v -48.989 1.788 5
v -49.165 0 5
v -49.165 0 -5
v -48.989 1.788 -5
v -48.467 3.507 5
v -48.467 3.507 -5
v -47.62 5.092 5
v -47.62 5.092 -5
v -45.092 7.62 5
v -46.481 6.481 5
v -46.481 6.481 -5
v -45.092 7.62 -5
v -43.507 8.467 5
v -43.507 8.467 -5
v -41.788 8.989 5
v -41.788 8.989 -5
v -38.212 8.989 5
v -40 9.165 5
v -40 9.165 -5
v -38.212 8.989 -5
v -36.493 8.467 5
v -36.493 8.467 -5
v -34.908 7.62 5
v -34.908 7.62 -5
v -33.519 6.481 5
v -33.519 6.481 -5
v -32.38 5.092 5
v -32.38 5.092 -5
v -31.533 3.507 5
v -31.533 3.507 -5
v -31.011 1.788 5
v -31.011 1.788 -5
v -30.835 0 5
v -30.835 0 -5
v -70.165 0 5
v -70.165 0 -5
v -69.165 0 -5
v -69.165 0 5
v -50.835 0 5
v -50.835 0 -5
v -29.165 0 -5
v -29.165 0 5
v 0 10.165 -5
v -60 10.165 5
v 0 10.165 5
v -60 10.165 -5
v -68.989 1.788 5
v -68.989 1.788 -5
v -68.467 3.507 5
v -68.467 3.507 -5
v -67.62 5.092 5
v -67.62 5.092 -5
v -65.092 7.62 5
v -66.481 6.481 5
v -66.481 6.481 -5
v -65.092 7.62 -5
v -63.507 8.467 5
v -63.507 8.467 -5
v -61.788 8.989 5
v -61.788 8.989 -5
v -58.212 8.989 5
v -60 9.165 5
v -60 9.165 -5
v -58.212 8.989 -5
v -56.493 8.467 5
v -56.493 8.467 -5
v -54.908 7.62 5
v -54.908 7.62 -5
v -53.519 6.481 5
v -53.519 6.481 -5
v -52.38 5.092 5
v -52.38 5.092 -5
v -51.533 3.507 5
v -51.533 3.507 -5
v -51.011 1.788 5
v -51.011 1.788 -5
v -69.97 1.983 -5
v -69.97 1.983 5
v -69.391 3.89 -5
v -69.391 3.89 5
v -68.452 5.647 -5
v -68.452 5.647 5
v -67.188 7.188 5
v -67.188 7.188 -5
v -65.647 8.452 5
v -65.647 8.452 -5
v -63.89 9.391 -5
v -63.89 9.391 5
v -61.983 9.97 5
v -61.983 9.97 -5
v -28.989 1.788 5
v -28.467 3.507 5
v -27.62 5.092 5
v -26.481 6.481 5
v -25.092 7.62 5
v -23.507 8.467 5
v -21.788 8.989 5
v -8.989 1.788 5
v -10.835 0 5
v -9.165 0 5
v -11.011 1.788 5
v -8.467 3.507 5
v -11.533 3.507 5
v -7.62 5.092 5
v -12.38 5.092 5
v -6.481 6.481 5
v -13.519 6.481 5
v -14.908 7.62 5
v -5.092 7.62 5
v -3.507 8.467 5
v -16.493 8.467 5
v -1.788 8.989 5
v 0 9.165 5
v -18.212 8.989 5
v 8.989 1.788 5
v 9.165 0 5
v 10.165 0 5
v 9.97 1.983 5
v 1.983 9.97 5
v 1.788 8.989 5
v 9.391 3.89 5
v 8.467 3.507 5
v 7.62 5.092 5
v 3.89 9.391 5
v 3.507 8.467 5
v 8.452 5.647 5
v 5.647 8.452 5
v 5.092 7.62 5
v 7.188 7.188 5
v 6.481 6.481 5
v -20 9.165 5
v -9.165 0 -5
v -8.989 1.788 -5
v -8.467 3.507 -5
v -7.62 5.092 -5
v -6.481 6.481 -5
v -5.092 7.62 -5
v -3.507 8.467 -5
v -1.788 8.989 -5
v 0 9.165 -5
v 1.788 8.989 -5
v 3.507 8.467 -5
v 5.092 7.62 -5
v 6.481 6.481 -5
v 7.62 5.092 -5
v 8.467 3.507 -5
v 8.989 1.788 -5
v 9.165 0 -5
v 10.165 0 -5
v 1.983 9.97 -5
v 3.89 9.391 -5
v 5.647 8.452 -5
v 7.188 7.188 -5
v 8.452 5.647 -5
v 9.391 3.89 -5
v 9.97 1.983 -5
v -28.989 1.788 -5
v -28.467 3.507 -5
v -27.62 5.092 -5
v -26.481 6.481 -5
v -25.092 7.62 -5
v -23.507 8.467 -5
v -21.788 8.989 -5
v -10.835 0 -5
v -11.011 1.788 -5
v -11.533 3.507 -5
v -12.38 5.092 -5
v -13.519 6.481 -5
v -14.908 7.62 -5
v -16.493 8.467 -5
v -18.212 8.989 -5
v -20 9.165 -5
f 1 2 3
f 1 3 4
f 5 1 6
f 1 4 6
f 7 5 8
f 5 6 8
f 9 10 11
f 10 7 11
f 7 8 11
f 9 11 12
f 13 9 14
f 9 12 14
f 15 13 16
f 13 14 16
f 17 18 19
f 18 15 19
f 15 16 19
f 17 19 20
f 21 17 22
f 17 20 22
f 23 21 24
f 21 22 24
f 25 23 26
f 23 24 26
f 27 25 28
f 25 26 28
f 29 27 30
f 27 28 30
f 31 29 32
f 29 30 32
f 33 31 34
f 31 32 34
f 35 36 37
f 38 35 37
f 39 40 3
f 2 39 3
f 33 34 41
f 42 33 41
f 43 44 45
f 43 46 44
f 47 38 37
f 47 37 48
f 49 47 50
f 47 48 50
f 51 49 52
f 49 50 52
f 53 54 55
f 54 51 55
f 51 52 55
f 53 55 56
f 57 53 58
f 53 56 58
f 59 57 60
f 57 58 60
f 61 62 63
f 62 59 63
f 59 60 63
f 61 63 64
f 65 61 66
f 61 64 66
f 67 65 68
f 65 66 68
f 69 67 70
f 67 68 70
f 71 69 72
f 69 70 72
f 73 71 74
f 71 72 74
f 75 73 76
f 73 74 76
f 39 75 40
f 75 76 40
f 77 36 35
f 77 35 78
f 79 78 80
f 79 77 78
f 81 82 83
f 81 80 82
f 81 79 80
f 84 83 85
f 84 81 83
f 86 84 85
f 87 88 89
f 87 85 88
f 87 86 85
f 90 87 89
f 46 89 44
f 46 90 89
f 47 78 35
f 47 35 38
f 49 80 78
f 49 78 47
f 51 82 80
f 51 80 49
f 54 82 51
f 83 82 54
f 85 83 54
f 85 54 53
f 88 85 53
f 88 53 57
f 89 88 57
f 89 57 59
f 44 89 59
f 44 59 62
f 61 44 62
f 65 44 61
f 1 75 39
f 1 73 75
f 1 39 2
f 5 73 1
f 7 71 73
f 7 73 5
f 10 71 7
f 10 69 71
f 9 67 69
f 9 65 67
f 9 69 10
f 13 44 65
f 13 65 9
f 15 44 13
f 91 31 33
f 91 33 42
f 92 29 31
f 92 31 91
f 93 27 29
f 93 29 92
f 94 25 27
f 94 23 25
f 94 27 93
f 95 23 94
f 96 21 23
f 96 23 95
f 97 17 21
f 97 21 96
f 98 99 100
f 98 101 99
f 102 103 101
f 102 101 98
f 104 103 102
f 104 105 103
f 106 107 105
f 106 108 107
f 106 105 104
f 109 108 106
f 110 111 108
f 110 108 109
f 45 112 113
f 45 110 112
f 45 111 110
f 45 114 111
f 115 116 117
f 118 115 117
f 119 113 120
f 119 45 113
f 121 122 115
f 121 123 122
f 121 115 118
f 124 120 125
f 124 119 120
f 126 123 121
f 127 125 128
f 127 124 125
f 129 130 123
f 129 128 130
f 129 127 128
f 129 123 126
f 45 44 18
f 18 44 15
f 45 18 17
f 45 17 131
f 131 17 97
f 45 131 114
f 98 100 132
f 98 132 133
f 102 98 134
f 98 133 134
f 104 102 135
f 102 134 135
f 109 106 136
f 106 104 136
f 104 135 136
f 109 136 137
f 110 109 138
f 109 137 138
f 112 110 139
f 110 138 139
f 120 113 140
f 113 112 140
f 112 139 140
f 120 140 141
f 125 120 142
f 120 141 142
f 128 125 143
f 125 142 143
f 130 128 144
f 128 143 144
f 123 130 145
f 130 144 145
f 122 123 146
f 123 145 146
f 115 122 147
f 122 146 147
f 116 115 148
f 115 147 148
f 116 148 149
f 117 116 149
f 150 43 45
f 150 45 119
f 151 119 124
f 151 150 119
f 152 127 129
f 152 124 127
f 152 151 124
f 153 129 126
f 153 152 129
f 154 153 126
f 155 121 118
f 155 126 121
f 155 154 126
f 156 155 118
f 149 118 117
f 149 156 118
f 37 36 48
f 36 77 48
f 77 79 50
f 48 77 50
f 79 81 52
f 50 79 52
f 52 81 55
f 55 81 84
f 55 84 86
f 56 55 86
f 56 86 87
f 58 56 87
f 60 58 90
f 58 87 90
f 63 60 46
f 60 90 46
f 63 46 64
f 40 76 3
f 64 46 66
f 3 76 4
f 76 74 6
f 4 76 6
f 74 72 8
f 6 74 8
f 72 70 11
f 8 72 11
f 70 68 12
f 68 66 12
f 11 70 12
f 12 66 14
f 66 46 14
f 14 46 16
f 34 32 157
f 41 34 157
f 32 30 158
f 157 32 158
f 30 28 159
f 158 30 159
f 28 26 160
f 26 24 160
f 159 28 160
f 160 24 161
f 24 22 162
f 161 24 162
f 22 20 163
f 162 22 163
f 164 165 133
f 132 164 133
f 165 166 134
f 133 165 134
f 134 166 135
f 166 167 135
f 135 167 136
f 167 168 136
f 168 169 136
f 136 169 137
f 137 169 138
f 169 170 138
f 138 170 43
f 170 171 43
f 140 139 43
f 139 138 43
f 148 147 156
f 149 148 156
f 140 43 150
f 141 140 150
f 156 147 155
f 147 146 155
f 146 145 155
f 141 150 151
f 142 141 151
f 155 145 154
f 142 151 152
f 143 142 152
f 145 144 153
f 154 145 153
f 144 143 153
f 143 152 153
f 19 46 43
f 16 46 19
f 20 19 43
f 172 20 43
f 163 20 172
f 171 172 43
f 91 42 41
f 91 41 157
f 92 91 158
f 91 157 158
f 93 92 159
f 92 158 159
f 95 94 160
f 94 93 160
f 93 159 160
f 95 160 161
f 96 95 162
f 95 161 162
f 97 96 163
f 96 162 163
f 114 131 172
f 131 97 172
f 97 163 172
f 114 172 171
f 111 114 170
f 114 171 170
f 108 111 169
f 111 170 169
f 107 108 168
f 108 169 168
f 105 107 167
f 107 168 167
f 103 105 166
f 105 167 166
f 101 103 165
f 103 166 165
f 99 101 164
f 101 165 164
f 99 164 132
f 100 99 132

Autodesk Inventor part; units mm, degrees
ref_plane "YZ Plane" through (0, 0, 0) normal (1, 0, 0) x (0, 1, 0)
ref_plane "XZ Plane" through (0, 0, 0) normal (0, 1, 0) x (-1, 0, 0)
ref_plane "XY Plane" through (0, 0, 0) normal (0, 0, 1) x (1, 0, 0)
sketch "Sketch1" plane through (0, 0, 0) normal (0, 0, 1) x (1, 0, 0)
  circle A0 centre (0, 0) radius 9.165
  line L0 (0, 0) -> (-2.3778, 0) construction
  circle A1 centre (-20, 0) radius 9.165
  circle A2 centre (-40, 0) radius 9.165
  circle A3 centre (-60, 0) radius 9.165
  arc A4 (10.165, 0) -> (0, 10.165) centre (0, 0) ccw
  arc A5 (-60, 10.165) -> (-70.165, 0) centre (-60, 0) ccw
  line L1 (-60, 10.165) -> (0, 10.165)
  line L2 (-50.835, 0) -> (-49.165, 0)
  line L3 (-30.835, 0) -> (-29.165, 0)
  line L4 (-10.835, 0) -> (-9.165, 0)
  line L5 (-70.165, 0) -> (-69.165, 0)
  line L6 (9.165, 0) -> (10.165, 0)
  dimension "d0" = 18.33
  dimension "d3" = 20
  dimension "d8" = 1
  dimension "d9" = 1
extrude "Extrusion1" add sketch "Sketch1" along normal mid plane 10 contours A0 L4 A1 L3 A2 L2 A3 L5 A5 L1 A4 L6
properties part number "batteryspacer"
